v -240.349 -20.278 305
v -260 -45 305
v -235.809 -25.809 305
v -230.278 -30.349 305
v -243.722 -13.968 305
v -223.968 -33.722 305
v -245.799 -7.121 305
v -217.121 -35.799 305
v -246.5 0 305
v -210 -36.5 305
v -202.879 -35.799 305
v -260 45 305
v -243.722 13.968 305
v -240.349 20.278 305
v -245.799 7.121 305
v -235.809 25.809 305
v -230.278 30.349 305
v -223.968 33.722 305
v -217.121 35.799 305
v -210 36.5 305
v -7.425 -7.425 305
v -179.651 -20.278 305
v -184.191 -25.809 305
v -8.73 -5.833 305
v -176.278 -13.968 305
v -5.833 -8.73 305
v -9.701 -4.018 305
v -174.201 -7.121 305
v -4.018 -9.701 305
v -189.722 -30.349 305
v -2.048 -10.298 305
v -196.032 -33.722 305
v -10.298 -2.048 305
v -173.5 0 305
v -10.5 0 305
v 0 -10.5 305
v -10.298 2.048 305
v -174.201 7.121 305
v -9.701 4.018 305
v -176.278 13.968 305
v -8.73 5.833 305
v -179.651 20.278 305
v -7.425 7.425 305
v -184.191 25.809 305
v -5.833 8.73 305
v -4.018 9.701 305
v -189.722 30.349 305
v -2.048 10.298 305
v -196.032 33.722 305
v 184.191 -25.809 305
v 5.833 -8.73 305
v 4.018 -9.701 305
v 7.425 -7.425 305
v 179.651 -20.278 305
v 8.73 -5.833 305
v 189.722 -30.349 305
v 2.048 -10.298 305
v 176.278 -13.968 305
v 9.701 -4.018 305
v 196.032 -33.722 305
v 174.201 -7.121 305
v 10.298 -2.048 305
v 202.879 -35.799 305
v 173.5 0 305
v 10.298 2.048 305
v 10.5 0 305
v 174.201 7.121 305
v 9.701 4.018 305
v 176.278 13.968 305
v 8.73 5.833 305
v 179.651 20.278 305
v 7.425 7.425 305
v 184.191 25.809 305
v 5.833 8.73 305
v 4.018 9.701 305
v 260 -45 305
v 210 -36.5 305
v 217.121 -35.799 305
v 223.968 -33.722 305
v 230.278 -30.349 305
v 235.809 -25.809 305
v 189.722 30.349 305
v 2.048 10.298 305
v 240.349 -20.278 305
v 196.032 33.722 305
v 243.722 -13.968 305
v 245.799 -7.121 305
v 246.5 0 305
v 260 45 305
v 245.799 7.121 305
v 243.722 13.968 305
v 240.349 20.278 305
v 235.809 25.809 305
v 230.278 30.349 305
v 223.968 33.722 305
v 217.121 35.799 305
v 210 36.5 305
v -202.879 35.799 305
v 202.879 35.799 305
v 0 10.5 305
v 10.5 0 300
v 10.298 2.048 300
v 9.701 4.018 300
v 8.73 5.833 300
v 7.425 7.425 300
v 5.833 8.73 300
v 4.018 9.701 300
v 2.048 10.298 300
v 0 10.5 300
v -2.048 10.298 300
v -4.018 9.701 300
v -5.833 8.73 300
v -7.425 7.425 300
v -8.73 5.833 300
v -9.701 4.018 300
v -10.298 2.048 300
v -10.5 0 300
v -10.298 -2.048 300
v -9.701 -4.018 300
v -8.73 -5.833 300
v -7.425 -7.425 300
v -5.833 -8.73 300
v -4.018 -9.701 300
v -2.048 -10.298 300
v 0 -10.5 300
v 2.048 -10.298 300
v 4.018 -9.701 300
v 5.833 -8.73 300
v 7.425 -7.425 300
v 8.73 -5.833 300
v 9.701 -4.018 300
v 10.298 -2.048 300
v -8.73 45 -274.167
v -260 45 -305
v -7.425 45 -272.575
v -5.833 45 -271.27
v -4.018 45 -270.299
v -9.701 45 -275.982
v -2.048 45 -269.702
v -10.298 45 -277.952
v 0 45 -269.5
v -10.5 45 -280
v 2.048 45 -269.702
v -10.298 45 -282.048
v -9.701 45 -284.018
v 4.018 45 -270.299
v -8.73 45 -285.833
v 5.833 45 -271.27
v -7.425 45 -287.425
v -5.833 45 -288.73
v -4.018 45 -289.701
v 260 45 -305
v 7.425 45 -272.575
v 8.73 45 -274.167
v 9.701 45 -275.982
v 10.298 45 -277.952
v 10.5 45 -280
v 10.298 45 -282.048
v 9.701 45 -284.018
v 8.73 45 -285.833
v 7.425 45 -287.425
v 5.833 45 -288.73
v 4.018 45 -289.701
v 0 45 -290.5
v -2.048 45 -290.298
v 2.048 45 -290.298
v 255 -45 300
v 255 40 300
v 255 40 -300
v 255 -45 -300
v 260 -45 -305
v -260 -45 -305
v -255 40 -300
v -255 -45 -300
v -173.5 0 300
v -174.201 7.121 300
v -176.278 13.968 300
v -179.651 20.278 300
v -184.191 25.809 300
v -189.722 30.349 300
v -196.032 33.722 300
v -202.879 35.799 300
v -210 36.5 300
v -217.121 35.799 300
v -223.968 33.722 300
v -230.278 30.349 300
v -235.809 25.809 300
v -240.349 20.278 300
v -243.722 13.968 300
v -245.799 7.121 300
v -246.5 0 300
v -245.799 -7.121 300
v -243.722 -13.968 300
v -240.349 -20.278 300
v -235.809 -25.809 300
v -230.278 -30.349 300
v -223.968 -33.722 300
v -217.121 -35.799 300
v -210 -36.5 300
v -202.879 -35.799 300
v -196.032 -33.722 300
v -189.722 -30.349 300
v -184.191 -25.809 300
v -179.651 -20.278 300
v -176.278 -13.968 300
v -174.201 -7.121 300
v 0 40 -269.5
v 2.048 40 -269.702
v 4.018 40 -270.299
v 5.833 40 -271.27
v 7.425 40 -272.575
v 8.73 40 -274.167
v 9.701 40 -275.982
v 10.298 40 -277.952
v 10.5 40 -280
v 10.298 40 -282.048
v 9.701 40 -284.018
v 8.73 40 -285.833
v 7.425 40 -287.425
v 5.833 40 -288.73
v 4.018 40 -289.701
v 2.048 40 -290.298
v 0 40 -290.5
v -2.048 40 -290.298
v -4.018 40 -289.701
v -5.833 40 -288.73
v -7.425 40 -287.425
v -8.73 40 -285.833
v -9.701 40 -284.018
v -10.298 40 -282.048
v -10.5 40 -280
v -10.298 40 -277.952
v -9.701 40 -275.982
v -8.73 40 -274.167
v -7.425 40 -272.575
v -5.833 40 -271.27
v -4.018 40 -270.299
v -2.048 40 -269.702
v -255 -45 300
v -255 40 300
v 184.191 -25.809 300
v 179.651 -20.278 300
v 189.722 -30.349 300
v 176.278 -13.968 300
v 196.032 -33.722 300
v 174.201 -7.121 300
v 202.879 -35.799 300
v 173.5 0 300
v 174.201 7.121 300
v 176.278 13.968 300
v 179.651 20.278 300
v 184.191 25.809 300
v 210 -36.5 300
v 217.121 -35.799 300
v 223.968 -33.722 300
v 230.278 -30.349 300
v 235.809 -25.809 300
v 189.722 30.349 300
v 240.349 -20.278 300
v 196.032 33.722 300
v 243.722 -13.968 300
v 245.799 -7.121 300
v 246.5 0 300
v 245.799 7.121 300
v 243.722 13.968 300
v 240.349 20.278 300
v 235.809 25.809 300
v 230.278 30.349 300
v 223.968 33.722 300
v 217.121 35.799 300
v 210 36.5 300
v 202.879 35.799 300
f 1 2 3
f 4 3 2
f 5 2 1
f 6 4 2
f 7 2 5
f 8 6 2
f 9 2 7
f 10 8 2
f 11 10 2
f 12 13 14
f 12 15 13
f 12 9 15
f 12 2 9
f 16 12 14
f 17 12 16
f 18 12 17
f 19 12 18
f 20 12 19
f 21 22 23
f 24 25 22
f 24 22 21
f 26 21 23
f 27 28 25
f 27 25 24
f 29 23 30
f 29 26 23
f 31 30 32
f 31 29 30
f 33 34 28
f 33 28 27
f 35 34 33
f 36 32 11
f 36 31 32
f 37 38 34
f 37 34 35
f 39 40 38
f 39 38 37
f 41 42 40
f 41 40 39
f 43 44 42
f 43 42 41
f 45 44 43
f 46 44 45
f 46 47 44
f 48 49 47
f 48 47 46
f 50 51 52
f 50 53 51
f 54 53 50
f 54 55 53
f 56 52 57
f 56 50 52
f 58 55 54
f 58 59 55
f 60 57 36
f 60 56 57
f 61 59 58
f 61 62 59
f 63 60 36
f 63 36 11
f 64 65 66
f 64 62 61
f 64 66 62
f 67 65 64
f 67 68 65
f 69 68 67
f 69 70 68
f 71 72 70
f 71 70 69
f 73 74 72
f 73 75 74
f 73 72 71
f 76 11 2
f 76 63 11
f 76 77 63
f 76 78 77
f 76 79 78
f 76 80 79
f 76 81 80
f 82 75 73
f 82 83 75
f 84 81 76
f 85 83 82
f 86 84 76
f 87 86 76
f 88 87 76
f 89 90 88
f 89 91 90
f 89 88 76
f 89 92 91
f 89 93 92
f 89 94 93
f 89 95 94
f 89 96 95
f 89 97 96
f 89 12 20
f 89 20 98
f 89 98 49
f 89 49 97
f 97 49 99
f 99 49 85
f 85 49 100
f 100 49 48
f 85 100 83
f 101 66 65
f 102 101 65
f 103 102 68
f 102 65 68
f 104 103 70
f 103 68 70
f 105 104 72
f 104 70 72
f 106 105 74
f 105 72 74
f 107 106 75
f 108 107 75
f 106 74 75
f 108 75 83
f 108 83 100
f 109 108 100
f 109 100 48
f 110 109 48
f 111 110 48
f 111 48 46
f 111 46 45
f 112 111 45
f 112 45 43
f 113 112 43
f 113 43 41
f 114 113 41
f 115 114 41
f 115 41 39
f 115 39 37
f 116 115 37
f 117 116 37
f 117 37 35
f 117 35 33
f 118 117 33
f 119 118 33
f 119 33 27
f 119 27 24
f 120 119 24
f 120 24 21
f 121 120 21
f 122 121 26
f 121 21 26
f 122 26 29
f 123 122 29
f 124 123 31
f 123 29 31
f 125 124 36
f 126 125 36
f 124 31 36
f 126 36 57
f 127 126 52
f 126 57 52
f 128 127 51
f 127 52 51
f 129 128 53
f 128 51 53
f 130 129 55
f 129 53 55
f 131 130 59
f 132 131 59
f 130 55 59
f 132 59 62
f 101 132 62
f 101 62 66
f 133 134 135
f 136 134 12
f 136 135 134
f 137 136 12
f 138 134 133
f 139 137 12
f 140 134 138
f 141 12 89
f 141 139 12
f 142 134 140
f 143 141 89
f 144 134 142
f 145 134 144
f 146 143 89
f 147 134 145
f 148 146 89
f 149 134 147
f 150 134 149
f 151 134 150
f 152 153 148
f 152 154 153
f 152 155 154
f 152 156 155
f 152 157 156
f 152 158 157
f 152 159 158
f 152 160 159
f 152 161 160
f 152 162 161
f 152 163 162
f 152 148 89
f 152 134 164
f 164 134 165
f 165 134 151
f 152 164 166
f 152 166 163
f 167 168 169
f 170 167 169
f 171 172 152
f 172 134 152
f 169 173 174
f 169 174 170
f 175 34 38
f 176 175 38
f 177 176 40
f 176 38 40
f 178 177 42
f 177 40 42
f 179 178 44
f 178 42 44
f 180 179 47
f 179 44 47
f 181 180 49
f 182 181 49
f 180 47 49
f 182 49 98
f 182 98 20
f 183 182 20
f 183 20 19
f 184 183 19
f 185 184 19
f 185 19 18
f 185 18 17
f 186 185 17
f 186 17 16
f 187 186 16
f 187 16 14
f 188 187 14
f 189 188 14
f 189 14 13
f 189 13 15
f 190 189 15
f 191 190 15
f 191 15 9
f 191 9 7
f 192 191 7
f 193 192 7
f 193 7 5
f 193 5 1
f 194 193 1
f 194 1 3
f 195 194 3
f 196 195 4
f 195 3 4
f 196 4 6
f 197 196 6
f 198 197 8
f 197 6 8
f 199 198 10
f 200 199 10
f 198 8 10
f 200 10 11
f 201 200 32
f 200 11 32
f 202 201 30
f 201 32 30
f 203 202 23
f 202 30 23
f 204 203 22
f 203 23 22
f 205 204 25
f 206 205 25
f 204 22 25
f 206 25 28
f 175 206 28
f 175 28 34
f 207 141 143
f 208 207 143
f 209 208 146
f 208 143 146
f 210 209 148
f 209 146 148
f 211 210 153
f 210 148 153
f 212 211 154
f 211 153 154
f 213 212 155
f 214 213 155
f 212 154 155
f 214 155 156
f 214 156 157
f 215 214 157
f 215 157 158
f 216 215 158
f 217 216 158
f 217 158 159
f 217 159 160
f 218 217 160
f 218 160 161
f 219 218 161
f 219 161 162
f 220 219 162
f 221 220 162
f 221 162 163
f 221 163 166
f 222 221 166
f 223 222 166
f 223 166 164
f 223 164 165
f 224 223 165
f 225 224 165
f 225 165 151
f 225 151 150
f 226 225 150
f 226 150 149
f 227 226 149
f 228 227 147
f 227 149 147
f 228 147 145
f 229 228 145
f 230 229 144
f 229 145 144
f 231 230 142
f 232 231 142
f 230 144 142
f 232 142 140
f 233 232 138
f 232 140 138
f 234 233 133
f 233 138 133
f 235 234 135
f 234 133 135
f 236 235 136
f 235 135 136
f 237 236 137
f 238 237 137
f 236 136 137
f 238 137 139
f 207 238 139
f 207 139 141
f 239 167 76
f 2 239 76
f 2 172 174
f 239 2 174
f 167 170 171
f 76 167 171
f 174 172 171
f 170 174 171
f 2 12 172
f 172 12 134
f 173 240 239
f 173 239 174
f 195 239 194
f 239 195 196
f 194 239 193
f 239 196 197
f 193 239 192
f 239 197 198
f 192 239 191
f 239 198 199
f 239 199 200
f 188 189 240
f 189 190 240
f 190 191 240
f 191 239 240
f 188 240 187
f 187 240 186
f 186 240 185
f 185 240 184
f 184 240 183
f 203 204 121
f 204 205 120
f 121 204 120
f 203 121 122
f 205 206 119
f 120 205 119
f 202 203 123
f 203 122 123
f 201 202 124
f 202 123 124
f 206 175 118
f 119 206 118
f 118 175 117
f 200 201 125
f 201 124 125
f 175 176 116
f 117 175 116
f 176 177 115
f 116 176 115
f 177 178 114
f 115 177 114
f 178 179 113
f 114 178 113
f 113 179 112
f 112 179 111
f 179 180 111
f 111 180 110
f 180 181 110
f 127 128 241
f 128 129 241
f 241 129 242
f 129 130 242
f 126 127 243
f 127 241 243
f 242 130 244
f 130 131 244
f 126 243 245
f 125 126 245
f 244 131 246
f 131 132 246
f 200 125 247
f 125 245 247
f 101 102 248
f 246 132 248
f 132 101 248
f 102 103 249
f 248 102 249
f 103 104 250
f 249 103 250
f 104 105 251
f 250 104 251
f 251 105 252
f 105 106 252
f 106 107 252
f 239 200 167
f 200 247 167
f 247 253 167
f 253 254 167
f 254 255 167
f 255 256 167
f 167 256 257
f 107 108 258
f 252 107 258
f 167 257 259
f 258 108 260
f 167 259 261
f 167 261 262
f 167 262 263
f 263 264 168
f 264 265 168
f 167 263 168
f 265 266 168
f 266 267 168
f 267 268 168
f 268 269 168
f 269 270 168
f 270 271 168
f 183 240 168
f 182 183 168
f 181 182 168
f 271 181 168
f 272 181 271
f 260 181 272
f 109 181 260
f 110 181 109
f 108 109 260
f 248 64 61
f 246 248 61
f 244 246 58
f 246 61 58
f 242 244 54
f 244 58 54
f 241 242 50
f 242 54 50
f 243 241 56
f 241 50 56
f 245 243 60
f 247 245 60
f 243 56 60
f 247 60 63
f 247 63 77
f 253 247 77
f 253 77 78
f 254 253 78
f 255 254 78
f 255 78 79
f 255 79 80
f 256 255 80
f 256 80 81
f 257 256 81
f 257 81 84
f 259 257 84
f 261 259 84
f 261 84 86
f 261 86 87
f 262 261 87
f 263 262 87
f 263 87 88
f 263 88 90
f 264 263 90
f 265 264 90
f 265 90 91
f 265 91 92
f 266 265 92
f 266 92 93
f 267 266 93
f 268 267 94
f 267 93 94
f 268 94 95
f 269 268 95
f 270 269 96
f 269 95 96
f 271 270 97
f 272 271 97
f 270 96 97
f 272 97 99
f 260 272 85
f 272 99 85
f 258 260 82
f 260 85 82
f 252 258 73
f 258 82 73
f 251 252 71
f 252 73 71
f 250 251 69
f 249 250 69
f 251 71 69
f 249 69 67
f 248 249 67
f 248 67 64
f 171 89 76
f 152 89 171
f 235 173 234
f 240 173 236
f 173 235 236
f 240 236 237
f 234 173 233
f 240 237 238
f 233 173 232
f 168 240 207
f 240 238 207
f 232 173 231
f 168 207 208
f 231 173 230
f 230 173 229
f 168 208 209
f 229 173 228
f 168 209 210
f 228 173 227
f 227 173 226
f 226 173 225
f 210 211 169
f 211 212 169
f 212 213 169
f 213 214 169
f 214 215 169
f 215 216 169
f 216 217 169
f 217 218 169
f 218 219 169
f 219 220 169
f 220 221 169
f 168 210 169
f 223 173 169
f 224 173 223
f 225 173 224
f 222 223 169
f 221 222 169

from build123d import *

# Parameters (mm, degrees)
SKETCH1_W           = 520
SKETCH1_H           = 610
BOSS_EXTRUDE1_DEPTH = 45
SHELL1_T            = -5
SKETCH4_R           = 10.5
CUT_EXTRUDE2_DEPTH  = 10
SKETCH5_R           = 10.5
CUT_EXTRUDE3_DEPTH  = 10
SKETCH3_R           = 36.5
CUT_EXTRUDE4_DEPTH  = 25


with BuildPart() as part:
    # Sketch1 → Boss-Extrude1 (new, symmetric)
    with BuildSketch(Plane(origin=(0, 0, 0), x_dir=(1, 0, 0), z_dir=(0, 1, 0))):
        Rectangle(SKETCH1_W, SKETCH1_H)
    extrude(amount=BOSS_EXTRUDE1_DEPTH, both=True)

    # Shell1
    shell1_openings = [part.faces().sort_by_distance(p)[0] for p in [
        (0, -45, 0),
    ]]
    offset(amount=SHELL1_T, openings=shell1_openings, kind=Kind.INTERSECTION)

    # Sketch4 → Cut-Extrude2 (cut)
    with BuildSketch(Plane(origin=(0, 45, 0), x_dir=(1, 0, 0), z_dir=(0, 1, 0))):
        with Locations((0, 280)):
            Circle(SKETCH4_R)
    extrude(amount=-CUT_EXTRUDE2_DEPTH, mode=Mode.SUBTRACT)

    # Sketch5 → Cut-Extrude3 (cut)
    with BuildSketch(Plane.XY.offset(305)):
        Circle(SKETCH5_R)
    extrude(amount=-CUT_EXTRUDE3_DEPTH, mode=Mode.SUBTRACT)

    # Sketch3 → Cut-Extrude4 (cut)
    with BuildSketch(Plane.XY.offset(305)):
        with Locations((-210, 0)):
            Circle(SKETCH3_R)
        with Locations((210, 0)):
            Circle(SKETCH3_R)
    extrude(amount=-CUT_EXTRUDE4_DEPTH, mode=Mode.SUBTRACT)


solid = part.part
